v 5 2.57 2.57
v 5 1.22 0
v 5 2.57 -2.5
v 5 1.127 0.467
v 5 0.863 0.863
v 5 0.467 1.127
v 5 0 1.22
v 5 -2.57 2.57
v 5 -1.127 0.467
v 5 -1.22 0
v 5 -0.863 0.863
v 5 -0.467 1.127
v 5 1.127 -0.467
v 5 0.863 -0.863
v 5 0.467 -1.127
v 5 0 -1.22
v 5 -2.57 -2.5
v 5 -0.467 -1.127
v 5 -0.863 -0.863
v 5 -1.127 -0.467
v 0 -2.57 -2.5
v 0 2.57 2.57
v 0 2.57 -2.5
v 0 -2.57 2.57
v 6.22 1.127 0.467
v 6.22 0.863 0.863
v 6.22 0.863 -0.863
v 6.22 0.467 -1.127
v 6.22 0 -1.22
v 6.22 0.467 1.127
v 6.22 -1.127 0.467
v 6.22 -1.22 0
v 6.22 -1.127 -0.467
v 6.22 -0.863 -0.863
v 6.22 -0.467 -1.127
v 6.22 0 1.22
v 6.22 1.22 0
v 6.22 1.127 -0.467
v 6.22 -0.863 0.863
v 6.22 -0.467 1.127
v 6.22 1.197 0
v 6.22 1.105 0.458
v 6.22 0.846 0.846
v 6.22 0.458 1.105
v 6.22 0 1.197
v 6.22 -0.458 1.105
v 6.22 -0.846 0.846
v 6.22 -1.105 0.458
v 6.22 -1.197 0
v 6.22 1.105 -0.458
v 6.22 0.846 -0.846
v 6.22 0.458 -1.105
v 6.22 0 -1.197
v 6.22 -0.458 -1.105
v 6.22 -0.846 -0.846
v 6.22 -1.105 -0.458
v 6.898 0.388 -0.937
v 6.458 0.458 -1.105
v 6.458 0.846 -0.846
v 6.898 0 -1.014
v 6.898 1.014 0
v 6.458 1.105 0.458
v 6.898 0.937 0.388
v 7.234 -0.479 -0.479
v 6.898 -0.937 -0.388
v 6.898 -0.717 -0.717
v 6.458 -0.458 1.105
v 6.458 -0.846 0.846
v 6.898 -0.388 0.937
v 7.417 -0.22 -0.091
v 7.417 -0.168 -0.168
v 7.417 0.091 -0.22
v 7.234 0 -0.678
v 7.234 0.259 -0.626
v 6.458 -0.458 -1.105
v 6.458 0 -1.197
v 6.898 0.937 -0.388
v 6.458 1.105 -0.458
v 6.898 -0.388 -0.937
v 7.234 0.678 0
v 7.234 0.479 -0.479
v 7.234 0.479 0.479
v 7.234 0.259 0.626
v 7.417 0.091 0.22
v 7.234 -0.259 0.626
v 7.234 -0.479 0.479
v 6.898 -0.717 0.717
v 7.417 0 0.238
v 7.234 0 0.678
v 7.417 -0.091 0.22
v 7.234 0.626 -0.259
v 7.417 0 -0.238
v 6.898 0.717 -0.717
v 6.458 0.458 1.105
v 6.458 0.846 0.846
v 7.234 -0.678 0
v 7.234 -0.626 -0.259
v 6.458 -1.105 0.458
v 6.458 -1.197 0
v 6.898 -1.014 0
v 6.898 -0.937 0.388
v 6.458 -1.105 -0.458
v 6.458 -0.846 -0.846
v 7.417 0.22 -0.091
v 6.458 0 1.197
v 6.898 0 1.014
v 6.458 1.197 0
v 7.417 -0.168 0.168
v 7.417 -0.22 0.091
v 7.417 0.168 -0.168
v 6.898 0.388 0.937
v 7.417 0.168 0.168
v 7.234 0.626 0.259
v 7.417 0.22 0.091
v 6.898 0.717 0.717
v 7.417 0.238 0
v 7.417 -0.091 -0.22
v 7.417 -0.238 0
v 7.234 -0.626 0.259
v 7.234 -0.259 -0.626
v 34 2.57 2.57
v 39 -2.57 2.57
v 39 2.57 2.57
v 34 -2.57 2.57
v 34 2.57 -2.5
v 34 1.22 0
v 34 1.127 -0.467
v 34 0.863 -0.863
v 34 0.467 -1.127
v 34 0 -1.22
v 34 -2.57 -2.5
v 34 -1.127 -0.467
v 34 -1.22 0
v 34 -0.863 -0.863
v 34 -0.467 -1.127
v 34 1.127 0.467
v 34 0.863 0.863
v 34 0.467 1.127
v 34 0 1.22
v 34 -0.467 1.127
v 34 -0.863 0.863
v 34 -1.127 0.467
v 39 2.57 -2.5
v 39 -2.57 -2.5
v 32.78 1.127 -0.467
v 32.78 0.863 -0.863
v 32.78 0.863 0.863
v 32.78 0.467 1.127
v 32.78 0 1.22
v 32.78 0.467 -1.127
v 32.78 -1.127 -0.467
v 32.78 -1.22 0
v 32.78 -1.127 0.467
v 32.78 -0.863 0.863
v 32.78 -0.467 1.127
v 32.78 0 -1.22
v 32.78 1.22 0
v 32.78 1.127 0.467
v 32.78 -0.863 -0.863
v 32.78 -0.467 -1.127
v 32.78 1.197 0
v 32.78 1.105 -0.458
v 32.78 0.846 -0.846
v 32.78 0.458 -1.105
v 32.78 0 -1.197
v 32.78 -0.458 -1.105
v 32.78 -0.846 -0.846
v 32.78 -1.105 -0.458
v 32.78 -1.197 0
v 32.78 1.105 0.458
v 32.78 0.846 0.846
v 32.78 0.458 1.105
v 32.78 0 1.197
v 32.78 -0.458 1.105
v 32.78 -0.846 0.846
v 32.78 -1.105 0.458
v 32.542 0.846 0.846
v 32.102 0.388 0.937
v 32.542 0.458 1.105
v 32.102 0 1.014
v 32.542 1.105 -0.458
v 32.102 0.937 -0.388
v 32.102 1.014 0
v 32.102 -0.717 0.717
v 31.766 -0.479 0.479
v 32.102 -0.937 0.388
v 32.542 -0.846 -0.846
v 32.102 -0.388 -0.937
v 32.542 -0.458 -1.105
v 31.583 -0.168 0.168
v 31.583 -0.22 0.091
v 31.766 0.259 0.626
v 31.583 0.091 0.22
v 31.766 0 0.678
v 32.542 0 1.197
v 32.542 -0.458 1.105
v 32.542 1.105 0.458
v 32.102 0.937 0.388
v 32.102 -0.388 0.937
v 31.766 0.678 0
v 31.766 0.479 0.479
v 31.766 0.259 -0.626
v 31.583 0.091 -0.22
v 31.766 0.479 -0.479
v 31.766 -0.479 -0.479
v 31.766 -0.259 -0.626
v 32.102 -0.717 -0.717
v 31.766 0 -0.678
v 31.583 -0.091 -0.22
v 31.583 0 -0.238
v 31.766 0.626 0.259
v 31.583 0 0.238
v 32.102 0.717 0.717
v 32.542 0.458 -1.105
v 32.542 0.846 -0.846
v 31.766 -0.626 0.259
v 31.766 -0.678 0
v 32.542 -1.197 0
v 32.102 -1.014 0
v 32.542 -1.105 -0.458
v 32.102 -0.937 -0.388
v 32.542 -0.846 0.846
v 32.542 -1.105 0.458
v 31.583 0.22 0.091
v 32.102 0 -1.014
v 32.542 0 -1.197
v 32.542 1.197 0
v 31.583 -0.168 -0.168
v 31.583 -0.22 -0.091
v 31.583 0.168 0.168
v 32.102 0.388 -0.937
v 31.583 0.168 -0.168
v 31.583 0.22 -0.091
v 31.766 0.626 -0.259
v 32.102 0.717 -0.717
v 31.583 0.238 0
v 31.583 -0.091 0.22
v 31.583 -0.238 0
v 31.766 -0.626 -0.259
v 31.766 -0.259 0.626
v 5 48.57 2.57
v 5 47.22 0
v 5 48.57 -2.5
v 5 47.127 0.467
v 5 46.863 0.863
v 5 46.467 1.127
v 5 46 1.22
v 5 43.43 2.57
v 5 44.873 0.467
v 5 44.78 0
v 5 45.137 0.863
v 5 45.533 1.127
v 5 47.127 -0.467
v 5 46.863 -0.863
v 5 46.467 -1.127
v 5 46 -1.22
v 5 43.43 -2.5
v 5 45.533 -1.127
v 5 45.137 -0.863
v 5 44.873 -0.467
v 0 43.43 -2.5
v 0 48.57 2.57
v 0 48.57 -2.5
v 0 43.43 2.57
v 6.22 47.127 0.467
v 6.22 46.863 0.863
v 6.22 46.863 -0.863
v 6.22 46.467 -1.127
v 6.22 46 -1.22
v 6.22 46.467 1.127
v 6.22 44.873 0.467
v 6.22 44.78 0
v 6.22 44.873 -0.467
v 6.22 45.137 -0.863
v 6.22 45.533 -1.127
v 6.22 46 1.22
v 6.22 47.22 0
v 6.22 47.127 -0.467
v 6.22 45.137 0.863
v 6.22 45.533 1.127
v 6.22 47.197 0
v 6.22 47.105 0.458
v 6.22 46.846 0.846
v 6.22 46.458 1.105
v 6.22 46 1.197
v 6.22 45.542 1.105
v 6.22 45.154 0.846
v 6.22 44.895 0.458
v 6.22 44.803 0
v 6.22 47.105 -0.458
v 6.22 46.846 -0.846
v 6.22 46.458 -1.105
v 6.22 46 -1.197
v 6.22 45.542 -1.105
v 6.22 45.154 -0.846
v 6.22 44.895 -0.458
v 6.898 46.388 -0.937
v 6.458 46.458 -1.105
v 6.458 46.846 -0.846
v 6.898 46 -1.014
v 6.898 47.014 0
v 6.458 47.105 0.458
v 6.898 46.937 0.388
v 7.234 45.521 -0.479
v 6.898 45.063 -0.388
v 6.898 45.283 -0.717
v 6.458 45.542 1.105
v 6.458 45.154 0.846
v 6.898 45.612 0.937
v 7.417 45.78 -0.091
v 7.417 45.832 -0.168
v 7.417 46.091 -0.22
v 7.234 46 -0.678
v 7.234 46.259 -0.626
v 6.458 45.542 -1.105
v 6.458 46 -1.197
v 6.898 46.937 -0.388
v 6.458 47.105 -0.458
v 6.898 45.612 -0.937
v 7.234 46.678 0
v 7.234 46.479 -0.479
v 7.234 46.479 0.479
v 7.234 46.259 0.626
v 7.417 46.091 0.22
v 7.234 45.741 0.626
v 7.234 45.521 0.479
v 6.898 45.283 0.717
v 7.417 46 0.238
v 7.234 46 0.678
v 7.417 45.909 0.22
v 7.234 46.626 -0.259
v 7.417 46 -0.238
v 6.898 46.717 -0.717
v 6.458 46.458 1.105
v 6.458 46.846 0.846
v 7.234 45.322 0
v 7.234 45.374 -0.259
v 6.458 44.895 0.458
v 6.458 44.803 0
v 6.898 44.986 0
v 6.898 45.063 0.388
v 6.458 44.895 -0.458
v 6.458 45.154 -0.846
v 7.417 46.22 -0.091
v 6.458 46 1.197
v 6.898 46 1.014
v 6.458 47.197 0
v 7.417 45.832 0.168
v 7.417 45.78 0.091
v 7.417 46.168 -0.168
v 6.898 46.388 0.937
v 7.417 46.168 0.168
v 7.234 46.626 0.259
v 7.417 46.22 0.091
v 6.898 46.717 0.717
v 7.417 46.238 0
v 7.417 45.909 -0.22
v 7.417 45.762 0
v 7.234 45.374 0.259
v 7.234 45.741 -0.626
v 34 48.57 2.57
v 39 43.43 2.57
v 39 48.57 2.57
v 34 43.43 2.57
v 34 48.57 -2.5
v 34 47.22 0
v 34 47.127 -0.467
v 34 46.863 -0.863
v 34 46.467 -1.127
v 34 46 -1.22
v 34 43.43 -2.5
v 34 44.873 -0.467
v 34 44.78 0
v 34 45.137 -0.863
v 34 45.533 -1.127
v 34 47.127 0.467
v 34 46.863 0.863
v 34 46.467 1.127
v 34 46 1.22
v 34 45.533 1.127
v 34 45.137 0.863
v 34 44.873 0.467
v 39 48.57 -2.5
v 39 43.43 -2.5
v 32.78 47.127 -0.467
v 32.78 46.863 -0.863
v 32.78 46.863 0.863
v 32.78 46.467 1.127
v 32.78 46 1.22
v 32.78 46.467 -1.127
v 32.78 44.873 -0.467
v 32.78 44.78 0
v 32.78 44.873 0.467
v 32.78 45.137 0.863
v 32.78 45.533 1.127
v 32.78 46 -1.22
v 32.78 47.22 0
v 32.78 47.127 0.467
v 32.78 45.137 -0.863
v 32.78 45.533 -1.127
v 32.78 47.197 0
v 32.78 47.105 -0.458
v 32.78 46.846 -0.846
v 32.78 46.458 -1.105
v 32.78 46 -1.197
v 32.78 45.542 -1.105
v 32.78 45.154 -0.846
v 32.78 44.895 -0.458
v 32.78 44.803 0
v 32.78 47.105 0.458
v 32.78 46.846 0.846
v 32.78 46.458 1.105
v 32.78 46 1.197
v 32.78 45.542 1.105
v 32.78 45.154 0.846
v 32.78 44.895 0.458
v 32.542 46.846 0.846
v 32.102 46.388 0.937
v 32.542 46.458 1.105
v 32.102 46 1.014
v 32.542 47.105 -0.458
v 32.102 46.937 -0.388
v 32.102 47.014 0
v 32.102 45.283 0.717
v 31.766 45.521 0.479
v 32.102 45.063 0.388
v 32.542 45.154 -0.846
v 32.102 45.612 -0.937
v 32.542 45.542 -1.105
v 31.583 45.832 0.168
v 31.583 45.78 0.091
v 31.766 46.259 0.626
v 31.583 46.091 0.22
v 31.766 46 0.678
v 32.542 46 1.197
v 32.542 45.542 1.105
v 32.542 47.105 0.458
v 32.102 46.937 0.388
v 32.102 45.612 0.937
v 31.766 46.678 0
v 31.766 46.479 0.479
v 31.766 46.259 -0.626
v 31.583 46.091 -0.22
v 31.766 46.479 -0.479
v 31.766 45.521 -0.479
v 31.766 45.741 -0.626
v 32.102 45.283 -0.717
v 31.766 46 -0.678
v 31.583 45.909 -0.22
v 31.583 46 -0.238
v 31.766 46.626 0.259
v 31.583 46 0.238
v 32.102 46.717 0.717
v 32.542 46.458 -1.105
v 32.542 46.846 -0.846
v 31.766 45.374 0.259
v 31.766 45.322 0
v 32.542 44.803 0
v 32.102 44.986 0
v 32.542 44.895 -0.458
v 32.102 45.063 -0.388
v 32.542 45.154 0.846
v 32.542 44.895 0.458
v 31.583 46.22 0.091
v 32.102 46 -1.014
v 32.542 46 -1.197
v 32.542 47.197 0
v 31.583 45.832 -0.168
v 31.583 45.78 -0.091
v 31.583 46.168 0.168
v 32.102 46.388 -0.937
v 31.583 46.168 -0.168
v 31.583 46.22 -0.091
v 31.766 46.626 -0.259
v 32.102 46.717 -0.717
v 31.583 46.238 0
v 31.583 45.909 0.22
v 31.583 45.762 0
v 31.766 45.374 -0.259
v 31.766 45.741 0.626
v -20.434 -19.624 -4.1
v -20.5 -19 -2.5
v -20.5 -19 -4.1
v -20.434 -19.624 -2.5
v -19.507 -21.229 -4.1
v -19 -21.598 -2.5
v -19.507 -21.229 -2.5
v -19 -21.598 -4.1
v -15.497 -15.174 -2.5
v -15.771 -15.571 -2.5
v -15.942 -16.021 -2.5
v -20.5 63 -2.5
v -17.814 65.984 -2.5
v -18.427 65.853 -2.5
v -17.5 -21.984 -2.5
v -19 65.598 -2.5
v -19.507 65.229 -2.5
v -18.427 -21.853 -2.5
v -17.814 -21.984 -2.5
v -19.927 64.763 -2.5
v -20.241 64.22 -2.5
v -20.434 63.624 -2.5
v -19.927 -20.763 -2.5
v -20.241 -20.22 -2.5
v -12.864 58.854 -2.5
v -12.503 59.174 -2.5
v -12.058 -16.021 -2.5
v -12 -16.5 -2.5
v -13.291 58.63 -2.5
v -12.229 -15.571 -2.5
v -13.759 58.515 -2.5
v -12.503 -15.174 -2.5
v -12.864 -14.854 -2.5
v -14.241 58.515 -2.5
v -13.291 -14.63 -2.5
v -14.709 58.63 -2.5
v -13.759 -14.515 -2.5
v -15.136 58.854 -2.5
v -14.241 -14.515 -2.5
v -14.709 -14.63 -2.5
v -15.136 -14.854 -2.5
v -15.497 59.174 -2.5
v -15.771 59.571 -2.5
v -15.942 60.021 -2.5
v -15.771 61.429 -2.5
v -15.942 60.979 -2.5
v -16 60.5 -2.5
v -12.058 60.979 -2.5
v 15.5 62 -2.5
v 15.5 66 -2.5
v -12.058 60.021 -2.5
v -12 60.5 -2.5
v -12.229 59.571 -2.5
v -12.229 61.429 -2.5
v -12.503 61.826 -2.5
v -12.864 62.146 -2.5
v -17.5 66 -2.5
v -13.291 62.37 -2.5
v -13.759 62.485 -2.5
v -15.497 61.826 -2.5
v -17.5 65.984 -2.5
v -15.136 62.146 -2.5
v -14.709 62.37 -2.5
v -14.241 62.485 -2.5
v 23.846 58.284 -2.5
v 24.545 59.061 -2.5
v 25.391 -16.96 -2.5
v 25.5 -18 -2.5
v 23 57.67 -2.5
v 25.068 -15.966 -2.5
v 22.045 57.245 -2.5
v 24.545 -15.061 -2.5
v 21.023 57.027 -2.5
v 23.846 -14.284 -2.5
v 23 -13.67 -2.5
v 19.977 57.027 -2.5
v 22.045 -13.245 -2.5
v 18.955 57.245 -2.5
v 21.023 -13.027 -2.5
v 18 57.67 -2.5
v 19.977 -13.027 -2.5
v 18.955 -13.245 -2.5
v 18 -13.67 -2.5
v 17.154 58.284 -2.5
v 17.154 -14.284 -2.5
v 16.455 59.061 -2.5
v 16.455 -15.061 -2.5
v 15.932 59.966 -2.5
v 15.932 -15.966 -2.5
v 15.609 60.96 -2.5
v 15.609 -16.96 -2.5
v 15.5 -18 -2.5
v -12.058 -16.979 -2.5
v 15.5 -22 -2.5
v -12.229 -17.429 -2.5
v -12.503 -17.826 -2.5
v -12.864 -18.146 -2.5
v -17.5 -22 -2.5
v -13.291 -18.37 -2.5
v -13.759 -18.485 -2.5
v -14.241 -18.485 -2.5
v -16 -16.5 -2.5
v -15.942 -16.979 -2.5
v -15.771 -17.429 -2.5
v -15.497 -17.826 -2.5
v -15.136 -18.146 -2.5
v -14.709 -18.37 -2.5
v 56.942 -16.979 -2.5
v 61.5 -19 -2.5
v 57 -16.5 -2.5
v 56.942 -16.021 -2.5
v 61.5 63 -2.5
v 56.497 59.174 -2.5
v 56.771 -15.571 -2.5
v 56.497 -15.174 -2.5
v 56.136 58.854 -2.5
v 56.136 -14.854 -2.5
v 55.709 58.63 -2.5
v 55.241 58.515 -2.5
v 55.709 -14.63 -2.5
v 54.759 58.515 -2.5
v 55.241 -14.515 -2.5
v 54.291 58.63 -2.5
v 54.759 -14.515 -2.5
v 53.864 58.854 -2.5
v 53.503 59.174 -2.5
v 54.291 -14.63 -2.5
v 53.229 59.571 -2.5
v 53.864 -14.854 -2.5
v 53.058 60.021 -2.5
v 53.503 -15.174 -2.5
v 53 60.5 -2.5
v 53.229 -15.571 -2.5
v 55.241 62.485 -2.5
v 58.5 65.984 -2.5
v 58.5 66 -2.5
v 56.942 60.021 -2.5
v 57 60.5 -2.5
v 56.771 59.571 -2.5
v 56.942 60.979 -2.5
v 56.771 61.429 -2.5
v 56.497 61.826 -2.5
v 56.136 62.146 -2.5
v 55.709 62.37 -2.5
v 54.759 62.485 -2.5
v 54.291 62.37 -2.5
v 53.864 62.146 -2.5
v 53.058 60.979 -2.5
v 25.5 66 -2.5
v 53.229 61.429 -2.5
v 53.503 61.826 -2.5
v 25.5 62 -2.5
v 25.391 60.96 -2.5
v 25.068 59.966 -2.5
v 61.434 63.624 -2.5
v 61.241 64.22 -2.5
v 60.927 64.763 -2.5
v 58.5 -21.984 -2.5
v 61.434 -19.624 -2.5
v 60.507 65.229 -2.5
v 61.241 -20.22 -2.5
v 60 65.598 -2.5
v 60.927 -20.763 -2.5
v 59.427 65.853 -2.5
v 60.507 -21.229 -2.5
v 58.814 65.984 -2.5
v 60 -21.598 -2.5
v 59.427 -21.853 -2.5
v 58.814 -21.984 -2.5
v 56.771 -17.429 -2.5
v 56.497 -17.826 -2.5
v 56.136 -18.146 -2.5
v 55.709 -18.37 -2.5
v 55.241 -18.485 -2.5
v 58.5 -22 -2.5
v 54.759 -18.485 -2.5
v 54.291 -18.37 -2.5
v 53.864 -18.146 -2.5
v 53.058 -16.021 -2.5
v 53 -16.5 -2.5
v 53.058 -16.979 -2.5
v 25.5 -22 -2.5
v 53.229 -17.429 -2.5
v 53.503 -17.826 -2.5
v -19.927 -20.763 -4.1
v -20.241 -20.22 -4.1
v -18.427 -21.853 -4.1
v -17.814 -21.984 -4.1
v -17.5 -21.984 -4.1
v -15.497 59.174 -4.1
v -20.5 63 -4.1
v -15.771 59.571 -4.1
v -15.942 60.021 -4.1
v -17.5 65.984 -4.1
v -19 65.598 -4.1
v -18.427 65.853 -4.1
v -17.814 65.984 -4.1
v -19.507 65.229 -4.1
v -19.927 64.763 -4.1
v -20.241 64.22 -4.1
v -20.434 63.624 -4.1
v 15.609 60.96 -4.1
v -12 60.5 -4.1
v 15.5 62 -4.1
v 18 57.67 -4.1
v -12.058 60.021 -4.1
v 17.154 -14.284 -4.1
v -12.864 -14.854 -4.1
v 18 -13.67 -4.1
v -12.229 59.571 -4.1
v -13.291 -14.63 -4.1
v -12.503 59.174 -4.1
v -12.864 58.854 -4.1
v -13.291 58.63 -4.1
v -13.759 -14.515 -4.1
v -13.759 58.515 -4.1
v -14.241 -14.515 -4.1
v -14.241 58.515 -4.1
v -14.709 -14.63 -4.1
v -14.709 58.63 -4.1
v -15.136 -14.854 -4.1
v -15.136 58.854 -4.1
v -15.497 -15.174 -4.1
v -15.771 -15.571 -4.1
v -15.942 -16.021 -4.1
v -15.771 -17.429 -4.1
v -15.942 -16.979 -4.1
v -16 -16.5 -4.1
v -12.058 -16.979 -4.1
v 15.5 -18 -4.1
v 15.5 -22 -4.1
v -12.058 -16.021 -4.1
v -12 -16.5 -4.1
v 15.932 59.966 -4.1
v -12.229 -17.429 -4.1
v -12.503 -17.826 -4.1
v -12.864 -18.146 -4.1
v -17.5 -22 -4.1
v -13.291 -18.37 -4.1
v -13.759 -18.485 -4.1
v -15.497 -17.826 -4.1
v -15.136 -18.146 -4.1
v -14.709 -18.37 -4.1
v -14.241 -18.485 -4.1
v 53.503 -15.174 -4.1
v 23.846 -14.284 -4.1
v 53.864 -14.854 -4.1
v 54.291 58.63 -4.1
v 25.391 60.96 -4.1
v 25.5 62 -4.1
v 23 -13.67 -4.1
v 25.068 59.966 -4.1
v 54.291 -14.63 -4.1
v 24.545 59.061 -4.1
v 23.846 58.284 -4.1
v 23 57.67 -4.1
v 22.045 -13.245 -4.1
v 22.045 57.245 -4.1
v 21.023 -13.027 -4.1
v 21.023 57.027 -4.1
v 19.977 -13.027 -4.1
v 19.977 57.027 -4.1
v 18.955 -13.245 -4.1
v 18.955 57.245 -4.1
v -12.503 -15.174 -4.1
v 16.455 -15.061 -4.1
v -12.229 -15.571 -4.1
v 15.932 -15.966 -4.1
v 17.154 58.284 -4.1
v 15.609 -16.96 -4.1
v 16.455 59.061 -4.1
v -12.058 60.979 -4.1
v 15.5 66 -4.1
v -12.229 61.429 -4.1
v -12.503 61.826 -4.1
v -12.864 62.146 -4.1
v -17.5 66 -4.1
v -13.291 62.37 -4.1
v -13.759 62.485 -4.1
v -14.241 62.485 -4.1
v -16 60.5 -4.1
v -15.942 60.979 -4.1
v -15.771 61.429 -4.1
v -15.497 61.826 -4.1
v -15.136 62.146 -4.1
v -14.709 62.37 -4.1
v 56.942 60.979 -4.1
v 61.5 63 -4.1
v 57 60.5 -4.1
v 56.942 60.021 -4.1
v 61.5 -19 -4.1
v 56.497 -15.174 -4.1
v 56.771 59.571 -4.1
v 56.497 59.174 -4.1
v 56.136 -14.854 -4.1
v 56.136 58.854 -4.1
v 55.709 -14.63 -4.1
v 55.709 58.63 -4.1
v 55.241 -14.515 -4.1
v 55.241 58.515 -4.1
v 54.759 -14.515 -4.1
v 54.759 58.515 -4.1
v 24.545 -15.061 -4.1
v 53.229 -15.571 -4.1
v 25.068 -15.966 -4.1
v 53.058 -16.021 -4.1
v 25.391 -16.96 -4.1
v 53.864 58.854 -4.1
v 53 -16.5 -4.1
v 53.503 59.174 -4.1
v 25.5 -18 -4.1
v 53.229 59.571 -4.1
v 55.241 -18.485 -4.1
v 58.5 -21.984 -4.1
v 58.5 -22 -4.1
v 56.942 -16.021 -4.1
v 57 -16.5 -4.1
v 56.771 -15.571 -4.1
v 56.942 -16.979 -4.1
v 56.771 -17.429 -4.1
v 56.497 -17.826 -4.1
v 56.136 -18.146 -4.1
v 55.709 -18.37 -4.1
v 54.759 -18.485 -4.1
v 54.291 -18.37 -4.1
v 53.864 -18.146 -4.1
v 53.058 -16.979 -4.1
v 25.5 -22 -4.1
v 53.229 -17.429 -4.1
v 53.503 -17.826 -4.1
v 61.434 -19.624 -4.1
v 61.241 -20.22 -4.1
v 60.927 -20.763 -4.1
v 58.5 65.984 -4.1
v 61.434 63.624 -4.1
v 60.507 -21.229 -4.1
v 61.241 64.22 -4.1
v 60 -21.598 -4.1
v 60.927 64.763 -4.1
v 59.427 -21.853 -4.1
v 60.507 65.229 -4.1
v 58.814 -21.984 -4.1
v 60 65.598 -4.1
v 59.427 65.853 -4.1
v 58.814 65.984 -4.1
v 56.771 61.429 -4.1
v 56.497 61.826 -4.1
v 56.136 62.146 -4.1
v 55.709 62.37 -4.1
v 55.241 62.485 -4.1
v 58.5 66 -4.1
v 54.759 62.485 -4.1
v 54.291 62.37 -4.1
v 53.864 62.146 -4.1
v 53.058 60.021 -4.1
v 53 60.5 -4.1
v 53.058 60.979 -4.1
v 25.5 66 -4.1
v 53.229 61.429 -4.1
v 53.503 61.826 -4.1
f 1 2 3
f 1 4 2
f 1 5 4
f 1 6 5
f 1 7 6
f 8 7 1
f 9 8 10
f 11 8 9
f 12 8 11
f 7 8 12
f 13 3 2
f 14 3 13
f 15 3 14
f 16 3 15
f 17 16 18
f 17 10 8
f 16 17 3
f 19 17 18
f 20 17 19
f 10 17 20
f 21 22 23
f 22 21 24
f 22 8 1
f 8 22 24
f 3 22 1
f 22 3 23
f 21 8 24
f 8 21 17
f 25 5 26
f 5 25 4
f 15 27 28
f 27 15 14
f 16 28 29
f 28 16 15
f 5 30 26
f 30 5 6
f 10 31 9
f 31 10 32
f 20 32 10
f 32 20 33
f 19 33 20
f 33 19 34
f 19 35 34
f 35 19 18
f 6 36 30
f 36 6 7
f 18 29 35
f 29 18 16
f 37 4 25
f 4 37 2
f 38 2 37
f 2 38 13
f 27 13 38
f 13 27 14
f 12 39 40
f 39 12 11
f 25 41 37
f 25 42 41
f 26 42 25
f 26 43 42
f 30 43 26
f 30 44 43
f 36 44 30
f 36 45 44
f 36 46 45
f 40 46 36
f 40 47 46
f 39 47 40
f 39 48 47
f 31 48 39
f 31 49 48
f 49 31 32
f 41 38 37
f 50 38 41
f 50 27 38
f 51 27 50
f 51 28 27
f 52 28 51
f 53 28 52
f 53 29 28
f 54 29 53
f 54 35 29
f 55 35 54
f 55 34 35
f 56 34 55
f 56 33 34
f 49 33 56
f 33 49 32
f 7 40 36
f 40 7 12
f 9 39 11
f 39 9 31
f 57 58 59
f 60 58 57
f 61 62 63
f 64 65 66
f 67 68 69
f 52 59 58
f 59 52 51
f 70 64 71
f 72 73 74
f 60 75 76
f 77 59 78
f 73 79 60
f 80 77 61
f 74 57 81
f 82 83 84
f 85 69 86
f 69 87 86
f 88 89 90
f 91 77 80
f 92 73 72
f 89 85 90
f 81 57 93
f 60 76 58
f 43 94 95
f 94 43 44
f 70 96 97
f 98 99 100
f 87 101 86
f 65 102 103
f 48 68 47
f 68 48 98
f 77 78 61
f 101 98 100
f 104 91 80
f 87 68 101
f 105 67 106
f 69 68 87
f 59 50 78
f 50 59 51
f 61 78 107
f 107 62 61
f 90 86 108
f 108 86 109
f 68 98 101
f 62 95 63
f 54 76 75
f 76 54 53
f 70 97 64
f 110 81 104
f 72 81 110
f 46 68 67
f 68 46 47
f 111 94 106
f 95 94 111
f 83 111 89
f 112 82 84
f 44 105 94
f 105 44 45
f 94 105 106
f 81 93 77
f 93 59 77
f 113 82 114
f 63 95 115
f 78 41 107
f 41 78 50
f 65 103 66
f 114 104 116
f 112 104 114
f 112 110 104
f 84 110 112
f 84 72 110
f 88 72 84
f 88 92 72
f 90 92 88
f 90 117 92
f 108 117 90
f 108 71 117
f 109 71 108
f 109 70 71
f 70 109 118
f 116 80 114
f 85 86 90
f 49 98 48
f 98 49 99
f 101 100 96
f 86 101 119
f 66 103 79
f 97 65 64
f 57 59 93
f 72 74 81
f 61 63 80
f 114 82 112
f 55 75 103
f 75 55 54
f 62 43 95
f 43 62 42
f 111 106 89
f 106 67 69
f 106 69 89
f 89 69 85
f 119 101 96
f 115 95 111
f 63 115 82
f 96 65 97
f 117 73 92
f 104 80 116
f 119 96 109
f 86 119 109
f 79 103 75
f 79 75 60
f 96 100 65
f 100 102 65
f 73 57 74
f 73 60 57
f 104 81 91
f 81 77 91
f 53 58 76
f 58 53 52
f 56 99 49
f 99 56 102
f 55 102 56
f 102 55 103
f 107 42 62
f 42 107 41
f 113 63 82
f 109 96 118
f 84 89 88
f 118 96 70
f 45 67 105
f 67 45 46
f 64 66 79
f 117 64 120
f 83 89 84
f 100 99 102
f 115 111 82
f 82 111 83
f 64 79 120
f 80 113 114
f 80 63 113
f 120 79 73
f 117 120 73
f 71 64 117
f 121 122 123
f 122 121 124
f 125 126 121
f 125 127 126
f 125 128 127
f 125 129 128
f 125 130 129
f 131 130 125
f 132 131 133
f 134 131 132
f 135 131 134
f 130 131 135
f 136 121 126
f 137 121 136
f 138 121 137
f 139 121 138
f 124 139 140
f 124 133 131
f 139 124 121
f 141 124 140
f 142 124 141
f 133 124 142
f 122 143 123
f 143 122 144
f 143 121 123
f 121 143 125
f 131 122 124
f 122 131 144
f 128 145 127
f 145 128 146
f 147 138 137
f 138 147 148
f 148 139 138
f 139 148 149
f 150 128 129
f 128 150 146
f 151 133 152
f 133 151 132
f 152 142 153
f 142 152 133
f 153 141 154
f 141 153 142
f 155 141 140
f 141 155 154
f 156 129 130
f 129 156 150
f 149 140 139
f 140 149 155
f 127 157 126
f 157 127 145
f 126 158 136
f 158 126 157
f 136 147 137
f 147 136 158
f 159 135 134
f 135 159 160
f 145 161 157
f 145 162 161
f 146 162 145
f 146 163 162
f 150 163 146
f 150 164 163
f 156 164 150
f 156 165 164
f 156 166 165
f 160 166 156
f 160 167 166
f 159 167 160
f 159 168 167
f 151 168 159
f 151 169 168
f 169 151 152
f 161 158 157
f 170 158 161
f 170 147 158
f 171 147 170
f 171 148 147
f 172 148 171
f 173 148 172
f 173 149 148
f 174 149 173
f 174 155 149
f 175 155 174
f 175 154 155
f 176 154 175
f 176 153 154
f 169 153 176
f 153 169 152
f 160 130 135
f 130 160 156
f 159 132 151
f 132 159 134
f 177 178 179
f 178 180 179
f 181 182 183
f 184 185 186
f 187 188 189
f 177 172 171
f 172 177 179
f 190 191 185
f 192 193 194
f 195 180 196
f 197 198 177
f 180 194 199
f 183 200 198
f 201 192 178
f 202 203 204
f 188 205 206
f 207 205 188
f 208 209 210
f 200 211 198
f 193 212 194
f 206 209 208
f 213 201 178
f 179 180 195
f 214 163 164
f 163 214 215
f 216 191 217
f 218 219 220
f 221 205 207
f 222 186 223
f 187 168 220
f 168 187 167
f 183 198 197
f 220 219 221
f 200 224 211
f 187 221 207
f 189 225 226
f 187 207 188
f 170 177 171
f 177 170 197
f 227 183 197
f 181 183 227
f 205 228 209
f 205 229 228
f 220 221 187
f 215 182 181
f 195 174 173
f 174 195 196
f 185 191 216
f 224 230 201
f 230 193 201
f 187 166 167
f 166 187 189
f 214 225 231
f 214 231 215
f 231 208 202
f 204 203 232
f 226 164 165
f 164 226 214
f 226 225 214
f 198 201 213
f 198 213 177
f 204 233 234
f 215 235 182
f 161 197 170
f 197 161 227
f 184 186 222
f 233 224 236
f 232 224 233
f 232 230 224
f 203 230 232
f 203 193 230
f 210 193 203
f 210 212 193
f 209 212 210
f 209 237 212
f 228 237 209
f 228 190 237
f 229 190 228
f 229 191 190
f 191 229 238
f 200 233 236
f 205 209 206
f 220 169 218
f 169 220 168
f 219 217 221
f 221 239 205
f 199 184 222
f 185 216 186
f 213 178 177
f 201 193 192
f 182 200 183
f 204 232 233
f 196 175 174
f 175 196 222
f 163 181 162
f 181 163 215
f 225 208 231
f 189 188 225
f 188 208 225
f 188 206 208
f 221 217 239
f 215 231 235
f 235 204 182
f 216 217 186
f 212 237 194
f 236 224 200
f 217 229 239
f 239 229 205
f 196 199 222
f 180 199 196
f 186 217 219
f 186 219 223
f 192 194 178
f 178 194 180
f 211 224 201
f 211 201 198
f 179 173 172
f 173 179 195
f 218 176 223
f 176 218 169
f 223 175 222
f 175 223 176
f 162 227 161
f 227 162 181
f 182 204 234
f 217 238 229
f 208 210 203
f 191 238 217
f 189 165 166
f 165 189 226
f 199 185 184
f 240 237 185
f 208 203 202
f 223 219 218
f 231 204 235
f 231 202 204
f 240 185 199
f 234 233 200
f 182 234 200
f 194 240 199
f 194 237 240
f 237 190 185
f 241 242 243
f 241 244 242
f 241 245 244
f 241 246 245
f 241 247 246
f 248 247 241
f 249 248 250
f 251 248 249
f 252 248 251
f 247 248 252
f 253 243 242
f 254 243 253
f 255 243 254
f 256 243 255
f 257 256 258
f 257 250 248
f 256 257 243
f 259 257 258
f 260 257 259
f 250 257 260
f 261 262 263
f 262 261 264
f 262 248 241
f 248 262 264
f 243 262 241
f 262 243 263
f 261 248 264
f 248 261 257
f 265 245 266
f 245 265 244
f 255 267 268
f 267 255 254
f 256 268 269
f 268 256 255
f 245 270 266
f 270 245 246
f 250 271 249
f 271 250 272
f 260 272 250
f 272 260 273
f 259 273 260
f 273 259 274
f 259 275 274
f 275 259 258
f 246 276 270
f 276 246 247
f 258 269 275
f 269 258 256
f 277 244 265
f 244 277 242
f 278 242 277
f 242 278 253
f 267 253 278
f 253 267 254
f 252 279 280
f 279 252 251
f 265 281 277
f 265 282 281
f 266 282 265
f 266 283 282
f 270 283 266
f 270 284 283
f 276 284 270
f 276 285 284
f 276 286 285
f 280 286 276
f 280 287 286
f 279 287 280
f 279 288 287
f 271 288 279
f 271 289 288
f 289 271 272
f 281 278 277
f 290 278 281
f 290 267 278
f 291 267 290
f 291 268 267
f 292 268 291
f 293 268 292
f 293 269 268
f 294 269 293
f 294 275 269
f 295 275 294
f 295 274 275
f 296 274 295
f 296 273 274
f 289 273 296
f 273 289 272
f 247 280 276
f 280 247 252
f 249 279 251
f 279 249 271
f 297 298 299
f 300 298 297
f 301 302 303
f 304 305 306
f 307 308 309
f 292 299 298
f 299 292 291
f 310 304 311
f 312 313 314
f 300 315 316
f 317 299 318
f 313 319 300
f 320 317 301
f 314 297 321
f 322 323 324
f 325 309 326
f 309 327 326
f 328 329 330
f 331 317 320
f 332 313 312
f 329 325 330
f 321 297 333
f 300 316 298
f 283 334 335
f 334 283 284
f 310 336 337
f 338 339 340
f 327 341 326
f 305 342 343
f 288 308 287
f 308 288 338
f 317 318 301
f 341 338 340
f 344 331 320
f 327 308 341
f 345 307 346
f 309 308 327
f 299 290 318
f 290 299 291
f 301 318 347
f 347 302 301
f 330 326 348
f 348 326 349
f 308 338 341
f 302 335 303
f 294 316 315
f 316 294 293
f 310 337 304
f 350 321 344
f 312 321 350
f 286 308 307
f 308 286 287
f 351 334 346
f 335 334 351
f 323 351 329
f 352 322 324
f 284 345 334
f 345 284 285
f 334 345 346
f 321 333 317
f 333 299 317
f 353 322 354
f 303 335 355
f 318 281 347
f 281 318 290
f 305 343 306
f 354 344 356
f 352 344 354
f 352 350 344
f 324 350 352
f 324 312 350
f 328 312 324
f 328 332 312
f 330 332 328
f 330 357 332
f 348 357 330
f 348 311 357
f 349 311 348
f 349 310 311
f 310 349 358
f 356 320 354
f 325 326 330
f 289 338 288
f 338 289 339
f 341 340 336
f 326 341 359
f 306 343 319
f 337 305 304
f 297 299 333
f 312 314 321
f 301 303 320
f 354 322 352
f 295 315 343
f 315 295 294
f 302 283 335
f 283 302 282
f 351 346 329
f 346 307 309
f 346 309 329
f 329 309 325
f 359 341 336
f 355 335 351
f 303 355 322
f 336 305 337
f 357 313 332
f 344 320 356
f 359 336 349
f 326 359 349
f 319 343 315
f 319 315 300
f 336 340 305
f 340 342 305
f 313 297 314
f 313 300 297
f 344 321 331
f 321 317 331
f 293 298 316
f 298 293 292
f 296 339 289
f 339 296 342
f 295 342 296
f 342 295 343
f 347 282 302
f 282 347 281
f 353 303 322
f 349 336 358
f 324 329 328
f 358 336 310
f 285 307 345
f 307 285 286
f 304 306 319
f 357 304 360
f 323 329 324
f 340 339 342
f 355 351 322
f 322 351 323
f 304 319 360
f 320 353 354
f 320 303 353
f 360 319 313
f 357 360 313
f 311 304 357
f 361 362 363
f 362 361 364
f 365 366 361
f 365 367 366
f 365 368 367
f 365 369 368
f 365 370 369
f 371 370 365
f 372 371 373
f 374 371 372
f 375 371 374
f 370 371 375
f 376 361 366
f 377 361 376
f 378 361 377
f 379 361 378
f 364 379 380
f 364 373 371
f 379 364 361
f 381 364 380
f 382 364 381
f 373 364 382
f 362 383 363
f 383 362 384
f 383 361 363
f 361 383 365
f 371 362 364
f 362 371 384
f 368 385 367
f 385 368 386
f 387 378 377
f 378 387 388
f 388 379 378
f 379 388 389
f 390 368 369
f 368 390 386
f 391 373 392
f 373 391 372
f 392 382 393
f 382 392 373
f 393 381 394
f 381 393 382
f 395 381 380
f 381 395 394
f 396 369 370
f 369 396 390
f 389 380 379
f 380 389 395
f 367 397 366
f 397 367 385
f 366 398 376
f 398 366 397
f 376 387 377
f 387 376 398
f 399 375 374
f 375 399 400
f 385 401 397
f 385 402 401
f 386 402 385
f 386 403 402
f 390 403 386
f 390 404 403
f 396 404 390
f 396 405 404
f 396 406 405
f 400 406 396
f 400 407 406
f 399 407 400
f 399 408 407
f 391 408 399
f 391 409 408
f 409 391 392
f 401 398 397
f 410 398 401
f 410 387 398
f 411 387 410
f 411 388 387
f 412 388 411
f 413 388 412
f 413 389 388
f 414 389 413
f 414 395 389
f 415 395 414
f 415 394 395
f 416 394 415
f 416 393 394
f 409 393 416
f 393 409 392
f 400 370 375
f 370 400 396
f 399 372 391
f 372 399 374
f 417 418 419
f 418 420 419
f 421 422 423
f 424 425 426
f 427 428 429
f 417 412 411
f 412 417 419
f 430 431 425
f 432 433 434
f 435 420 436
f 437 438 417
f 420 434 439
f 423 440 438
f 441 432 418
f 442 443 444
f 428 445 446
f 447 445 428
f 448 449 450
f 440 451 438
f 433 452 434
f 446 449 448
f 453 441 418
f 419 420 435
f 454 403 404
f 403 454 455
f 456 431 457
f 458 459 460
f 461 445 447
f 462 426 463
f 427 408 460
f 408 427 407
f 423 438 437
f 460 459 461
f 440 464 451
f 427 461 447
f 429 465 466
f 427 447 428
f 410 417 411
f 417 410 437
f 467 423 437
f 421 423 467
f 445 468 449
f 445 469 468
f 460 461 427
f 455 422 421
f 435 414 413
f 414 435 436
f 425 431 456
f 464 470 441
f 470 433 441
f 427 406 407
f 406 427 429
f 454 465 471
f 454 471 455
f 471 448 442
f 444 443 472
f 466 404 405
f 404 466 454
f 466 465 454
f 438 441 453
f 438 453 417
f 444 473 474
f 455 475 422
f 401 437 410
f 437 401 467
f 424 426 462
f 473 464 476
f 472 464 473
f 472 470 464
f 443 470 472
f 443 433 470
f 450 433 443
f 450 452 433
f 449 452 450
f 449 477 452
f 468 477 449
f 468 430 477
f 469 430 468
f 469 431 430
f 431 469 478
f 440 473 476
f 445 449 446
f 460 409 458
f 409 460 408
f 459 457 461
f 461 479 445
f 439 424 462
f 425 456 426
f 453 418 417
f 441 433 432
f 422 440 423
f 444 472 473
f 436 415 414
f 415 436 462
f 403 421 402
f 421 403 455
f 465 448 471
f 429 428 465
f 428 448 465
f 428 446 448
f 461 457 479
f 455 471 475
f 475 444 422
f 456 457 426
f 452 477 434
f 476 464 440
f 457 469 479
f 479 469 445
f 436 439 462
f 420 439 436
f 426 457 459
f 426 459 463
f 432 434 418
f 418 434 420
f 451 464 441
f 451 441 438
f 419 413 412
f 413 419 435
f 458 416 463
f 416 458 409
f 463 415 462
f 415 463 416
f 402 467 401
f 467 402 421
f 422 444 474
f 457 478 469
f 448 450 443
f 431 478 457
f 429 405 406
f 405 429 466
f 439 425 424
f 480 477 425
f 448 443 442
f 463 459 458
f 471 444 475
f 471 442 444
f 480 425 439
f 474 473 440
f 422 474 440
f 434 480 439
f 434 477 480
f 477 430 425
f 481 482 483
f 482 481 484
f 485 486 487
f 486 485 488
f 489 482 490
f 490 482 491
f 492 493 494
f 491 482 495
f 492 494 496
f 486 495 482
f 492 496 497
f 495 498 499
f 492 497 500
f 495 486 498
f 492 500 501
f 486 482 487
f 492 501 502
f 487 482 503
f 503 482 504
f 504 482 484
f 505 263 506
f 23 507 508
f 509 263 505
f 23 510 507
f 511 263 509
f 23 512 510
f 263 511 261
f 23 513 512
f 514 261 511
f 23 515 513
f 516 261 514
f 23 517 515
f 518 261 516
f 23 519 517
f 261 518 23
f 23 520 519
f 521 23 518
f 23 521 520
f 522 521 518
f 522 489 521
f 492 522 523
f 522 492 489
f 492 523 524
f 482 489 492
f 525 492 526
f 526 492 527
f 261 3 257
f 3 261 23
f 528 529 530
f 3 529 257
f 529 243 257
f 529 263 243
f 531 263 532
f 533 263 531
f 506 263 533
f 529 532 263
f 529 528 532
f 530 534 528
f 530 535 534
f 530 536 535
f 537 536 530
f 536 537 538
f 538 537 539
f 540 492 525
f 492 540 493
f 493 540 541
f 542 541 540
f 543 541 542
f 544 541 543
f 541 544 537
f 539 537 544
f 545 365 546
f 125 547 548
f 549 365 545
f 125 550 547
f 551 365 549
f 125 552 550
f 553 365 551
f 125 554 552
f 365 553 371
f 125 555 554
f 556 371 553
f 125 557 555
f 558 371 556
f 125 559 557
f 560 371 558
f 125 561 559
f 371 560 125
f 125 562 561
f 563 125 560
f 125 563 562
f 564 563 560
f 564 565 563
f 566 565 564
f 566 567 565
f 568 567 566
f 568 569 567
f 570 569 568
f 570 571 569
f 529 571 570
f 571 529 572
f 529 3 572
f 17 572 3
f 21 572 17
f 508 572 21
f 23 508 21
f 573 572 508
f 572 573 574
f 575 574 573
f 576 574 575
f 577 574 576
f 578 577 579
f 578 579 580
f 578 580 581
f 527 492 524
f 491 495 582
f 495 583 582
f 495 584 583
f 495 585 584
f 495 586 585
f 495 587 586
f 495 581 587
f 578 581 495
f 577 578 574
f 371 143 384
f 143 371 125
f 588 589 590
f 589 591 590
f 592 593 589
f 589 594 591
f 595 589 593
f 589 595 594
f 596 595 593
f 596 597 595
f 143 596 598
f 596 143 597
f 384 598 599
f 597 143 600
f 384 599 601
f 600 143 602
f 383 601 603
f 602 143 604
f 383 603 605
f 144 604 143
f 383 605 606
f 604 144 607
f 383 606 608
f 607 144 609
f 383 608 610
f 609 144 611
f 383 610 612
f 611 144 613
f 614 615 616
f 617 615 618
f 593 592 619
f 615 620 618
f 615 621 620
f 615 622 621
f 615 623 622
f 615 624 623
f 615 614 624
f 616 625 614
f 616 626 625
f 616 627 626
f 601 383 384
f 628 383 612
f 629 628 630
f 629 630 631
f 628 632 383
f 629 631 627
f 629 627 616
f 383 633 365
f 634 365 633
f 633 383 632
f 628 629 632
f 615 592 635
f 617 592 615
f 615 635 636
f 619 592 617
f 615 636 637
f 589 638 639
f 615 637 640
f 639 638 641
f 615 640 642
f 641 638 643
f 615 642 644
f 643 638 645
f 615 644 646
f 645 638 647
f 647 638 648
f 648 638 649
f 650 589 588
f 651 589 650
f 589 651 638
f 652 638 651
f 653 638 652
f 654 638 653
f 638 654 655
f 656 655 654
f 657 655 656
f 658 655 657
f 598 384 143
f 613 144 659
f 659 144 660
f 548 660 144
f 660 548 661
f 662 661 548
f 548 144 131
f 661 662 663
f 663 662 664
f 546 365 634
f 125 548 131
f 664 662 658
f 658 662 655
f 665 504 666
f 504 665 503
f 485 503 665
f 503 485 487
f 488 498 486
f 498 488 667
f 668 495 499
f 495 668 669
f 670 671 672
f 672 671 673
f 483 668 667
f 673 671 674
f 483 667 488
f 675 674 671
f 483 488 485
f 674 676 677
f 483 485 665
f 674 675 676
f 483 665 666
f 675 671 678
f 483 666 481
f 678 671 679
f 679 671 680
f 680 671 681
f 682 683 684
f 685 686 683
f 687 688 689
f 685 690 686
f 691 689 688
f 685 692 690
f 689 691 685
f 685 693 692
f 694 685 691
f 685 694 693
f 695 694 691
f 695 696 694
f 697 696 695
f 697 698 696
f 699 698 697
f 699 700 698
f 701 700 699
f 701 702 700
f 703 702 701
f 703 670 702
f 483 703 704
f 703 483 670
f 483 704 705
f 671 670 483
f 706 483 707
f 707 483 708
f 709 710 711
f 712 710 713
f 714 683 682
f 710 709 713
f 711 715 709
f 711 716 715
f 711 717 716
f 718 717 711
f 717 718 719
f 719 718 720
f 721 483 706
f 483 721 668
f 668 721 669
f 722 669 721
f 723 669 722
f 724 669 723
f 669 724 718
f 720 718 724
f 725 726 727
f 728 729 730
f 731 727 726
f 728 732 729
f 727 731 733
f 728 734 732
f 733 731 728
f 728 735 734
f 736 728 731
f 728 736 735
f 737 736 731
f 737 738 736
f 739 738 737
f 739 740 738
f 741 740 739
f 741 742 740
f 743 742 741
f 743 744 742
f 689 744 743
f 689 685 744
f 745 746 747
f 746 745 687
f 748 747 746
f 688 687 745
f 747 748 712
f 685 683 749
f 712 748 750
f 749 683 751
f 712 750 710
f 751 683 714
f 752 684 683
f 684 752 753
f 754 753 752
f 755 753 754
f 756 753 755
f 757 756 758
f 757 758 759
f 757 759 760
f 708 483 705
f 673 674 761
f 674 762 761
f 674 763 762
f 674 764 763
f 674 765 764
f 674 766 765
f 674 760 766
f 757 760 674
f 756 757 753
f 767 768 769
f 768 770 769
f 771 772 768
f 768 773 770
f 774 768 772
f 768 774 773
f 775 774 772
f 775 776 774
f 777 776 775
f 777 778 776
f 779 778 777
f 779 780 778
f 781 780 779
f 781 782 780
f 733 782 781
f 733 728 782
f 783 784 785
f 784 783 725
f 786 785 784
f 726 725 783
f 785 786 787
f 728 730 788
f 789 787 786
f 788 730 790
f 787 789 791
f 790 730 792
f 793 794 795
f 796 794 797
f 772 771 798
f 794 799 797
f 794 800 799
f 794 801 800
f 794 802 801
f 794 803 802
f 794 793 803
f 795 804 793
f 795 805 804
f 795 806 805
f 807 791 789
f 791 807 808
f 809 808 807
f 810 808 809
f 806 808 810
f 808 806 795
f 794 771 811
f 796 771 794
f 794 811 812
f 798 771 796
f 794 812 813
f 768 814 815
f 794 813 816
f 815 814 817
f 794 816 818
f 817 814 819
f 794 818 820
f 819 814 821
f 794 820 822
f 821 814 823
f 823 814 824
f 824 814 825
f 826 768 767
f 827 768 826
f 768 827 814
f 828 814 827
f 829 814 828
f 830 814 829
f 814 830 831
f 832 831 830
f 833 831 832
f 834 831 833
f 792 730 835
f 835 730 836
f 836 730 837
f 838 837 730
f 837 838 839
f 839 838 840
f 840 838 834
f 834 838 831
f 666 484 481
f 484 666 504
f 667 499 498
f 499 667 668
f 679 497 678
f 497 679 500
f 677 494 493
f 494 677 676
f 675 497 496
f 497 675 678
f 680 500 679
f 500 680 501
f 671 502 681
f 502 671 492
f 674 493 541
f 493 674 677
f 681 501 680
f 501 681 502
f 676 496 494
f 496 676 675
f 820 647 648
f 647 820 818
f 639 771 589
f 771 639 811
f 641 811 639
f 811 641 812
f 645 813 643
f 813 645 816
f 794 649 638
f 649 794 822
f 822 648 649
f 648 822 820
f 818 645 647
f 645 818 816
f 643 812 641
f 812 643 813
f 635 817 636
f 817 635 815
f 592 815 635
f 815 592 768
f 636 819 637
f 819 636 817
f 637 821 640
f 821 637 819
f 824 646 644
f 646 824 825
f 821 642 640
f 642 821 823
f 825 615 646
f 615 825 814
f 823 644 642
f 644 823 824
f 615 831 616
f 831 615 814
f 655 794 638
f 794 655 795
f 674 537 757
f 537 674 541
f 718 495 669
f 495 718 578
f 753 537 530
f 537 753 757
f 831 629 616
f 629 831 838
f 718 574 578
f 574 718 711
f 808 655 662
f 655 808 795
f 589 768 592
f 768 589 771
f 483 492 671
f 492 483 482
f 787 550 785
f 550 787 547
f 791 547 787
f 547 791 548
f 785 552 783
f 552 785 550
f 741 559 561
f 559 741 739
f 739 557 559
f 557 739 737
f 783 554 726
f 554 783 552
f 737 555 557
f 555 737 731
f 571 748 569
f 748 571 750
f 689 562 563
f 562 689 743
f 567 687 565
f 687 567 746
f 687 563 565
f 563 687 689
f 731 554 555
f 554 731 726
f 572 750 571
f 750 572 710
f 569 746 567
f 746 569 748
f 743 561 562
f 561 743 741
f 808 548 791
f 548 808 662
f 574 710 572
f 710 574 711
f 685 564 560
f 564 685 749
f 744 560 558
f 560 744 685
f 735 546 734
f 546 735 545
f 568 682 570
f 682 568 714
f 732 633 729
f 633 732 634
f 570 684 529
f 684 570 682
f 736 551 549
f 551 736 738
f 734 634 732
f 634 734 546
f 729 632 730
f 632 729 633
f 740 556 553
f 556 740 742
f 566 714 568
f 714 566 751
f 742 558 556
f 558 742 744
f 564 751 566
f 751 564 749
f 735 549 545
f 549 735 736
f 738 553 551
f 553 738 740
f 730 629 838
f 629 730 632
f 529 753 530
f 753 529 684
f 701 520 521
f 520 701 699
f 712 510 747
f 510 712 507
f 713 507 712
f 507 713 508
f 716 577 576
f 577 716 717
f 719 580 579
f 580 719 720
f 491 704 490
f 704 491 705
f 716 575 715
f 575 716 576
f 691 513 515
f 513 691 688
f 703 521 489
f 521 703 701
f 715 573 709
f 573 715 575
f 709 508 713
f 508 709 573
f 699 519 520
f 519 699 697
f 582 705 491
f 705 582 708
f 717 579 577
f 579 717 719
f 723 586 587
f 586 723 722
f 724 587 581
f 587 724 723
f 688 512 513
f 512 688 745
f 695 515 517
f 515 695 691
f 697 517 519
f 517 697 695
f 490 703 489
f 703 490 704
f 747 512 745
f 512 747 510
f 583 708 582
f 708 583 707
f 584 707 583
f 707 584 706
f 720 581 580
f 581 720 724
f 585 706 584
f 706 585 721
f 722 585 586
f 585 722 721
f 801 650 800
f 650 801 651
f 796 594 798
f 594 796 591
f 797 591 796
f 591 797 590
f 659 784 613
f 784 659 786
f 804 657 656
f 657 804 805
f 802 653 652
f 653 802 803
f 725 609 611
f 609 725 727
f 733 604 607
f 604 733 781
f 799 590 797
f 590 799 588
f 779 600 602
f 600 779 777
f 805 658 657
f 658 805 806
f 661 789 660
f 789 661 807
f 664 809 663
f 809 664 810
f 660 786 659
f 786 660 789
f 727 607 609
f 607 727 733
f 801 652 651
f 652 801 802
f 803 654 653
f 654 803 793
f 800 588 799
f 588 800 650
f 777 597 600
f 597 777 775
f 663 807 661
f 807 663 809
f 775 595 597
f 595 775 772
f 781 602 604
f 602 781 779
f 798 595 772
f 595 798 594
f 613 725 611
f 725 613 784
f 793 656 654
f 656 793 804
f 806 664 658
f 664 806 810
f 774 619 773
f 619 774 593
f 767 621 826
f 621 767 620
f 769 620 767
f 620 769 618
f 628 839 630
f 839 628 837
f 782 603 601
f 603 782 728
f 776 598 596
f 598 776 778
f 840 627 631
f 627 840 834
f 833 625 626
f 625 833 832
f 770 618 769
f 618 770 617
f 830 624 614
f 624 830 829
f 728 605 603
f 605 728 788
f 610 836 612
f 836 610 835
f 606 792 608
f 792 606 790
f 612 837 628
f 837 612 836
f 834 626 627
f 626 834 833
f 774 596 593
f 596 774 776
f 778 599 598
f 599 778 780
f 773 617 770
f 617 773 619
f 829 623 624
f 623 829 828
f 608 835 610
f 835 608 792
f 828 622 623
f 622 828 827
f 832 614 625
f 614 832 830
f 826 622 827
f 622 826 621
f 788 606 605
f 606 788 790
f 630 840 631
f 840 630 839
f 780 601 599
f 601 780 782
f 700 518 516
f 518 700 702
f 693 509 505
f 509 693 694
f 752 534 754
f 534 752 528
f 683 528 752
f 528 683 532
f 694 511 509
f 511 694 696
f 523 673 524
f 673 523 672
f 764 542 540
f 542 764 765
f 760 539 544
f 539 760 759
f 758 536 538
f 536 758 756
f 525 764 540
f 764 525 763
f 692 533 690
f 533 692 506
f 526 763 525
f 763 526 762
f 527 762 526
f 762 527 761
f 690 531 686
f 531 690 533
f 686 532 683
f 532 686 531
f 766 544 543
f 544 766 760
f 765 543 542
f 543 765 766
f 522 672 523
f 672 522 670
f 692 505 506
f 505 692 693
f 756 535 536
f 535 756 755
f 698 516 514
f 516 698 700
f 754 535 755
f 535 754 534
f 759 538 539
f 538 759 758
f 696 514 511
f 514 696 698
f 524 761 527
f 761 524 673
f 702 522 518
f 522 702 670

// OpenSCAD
// file: ../parts/pegs.scad
// Basic stand-off peg.  Defaults for a feather.
module peg(h1=5, r1=1.22, r2=2.57) {
  h2=r1*2;
  translate([-r2,-r2,0]) cube([r2*2, r2*2, h1]);
  cylinder(r=r1,h=h1+h2/2);
  translate([0, 0, h1+h2/2]) sphere(r=r1);
}

// Place pegs
module manyPegs(locations=[], sizes) {
  // If sizes is undef, then make array of default sizes same length as locations.
  sizes = sizes==undef ? [for(i=locations) [5, 1.22, 2.57] ] : sizes;

  for( idx = [0 : len(locations)-1]) {
    translate(locations[idx]) {
      h=sizes[idx][0];
      r1=sizes[idx][1];
      r2=sizes[idx][2];
      peg(h1=h, r1=r1, r2=r2);
    }
  }
}

// Layouts for boards I use:

function featherTriWing_locations(edgeToPegCenter=2.57) =  [
  [edgeToPegCenter, edgeToPegCenter, 0],
  [71-edgeToPegCenter, edgeToPegCenter, 0],
  [71-edgeToPegCenter, 51-edgeToPegCenter, 0],
  [edgeToPegCenter, 51-edgeToPegCenter, 0],
];
function featherTriWing_sizes(h=5, edgeToPegCenter=2.57) =  [
  for (i=[0:3]) [h, 1.22, edgeToPegCenter]
];

// Huzzah ESP8266 has two differnet peg sizes and locations.
// two are 1.91mm from edgeToCenter.
function featherHuzzahESP8266_locations() = [
  [2.57, 2.57, 0],
  [23-2.57, 2.57, 0],
  [23-1.91, 51-2.57, 0],
  [1.91, 51-2.57, 0],
];
// two are 2.29mm wide.(r=1.145)
function featherHuzzahESP8266_sizes(h=5) = [
  [h, 1.22, 2.57],
  [h, 1.22, 2.57],
  [h, 1.145, 1.91],
  [h, 1.145, 1.91],
];

// ======================================================================
// manyPegs(locations=featherTriWing_locations());
manyPegs(locations=featherHuzzahESP8266_locations(), sizes=featherHuzzahESP8266_sizes());
// main file
echo(version=version());
use <MCAD/boxes.scad>
use <../parts/pegs.scad>

// Values are in millimeters

$fs=0.5;
////////////////////////////

extruder_width = 0.4;
wall_thickness = 2*extruder_width;

/*
eventually, needs to be a flat rectangle that mounts to case, and has peg/clips to hold stacked feathers.

*/

module lpeg() {
	rotate([0,90,0]) peg();
}
module rpeg() {
	rotate([0,270,0]) peg();
}

lpeg();
translate([27+10+2,0,0]) rpeg(); 
translate([0, 46, 0]) {
	lpeg();
	translate([27+10+2,0,0]) rpeg(); 
}

difference() {
	// translate([-82/4, -88/4, -4]) cube([82, 88, wall_thickness*2]);
	translate([82/4, 88/4, -wall_thickness -2.5]) roundedBox([82, 88, wall_thickness*2], 3, true);

	// Extra thingies. (why are they a different height?)
	translate([82/4, -88/4 + 4, -4.5]) cylinder(d=10, h=wall_thickness*3);
	translate([82/4, -88/4 + 4 -5, -3.5]) cube([10, 10, wall_thickness*3], center=true);
	translate([82/4, 88*3/4 - 4, -4.5]) cylinder(d=10, h=wall_thickness*3);
	translate([82/4, 88*3/4 - 4 +5, -3.5]) cube([10, 10, wall_thickness*3], center=true);

	// Mounting holes.
	translate([-82/4 + 6.5, -88/4 + 5.5, -4.5]) cylinder(d=4,h=wall_thickness*3);
	translate([82*3/4 - 6.5, -88/4 + 5.5, -4.5]) cylinder(d=4,h=wall_thickness*3);
	translate([82*3/4 - 6.5, 88*3/4 - 5.5, -4.5]) cylinder(d=4,h=wall_thickness*3);
	translate([-82/4 + 6.5, 88*3/4 - 5.5, -4.5]) cylinder(d=4,h=wall_thickness*3);
}
